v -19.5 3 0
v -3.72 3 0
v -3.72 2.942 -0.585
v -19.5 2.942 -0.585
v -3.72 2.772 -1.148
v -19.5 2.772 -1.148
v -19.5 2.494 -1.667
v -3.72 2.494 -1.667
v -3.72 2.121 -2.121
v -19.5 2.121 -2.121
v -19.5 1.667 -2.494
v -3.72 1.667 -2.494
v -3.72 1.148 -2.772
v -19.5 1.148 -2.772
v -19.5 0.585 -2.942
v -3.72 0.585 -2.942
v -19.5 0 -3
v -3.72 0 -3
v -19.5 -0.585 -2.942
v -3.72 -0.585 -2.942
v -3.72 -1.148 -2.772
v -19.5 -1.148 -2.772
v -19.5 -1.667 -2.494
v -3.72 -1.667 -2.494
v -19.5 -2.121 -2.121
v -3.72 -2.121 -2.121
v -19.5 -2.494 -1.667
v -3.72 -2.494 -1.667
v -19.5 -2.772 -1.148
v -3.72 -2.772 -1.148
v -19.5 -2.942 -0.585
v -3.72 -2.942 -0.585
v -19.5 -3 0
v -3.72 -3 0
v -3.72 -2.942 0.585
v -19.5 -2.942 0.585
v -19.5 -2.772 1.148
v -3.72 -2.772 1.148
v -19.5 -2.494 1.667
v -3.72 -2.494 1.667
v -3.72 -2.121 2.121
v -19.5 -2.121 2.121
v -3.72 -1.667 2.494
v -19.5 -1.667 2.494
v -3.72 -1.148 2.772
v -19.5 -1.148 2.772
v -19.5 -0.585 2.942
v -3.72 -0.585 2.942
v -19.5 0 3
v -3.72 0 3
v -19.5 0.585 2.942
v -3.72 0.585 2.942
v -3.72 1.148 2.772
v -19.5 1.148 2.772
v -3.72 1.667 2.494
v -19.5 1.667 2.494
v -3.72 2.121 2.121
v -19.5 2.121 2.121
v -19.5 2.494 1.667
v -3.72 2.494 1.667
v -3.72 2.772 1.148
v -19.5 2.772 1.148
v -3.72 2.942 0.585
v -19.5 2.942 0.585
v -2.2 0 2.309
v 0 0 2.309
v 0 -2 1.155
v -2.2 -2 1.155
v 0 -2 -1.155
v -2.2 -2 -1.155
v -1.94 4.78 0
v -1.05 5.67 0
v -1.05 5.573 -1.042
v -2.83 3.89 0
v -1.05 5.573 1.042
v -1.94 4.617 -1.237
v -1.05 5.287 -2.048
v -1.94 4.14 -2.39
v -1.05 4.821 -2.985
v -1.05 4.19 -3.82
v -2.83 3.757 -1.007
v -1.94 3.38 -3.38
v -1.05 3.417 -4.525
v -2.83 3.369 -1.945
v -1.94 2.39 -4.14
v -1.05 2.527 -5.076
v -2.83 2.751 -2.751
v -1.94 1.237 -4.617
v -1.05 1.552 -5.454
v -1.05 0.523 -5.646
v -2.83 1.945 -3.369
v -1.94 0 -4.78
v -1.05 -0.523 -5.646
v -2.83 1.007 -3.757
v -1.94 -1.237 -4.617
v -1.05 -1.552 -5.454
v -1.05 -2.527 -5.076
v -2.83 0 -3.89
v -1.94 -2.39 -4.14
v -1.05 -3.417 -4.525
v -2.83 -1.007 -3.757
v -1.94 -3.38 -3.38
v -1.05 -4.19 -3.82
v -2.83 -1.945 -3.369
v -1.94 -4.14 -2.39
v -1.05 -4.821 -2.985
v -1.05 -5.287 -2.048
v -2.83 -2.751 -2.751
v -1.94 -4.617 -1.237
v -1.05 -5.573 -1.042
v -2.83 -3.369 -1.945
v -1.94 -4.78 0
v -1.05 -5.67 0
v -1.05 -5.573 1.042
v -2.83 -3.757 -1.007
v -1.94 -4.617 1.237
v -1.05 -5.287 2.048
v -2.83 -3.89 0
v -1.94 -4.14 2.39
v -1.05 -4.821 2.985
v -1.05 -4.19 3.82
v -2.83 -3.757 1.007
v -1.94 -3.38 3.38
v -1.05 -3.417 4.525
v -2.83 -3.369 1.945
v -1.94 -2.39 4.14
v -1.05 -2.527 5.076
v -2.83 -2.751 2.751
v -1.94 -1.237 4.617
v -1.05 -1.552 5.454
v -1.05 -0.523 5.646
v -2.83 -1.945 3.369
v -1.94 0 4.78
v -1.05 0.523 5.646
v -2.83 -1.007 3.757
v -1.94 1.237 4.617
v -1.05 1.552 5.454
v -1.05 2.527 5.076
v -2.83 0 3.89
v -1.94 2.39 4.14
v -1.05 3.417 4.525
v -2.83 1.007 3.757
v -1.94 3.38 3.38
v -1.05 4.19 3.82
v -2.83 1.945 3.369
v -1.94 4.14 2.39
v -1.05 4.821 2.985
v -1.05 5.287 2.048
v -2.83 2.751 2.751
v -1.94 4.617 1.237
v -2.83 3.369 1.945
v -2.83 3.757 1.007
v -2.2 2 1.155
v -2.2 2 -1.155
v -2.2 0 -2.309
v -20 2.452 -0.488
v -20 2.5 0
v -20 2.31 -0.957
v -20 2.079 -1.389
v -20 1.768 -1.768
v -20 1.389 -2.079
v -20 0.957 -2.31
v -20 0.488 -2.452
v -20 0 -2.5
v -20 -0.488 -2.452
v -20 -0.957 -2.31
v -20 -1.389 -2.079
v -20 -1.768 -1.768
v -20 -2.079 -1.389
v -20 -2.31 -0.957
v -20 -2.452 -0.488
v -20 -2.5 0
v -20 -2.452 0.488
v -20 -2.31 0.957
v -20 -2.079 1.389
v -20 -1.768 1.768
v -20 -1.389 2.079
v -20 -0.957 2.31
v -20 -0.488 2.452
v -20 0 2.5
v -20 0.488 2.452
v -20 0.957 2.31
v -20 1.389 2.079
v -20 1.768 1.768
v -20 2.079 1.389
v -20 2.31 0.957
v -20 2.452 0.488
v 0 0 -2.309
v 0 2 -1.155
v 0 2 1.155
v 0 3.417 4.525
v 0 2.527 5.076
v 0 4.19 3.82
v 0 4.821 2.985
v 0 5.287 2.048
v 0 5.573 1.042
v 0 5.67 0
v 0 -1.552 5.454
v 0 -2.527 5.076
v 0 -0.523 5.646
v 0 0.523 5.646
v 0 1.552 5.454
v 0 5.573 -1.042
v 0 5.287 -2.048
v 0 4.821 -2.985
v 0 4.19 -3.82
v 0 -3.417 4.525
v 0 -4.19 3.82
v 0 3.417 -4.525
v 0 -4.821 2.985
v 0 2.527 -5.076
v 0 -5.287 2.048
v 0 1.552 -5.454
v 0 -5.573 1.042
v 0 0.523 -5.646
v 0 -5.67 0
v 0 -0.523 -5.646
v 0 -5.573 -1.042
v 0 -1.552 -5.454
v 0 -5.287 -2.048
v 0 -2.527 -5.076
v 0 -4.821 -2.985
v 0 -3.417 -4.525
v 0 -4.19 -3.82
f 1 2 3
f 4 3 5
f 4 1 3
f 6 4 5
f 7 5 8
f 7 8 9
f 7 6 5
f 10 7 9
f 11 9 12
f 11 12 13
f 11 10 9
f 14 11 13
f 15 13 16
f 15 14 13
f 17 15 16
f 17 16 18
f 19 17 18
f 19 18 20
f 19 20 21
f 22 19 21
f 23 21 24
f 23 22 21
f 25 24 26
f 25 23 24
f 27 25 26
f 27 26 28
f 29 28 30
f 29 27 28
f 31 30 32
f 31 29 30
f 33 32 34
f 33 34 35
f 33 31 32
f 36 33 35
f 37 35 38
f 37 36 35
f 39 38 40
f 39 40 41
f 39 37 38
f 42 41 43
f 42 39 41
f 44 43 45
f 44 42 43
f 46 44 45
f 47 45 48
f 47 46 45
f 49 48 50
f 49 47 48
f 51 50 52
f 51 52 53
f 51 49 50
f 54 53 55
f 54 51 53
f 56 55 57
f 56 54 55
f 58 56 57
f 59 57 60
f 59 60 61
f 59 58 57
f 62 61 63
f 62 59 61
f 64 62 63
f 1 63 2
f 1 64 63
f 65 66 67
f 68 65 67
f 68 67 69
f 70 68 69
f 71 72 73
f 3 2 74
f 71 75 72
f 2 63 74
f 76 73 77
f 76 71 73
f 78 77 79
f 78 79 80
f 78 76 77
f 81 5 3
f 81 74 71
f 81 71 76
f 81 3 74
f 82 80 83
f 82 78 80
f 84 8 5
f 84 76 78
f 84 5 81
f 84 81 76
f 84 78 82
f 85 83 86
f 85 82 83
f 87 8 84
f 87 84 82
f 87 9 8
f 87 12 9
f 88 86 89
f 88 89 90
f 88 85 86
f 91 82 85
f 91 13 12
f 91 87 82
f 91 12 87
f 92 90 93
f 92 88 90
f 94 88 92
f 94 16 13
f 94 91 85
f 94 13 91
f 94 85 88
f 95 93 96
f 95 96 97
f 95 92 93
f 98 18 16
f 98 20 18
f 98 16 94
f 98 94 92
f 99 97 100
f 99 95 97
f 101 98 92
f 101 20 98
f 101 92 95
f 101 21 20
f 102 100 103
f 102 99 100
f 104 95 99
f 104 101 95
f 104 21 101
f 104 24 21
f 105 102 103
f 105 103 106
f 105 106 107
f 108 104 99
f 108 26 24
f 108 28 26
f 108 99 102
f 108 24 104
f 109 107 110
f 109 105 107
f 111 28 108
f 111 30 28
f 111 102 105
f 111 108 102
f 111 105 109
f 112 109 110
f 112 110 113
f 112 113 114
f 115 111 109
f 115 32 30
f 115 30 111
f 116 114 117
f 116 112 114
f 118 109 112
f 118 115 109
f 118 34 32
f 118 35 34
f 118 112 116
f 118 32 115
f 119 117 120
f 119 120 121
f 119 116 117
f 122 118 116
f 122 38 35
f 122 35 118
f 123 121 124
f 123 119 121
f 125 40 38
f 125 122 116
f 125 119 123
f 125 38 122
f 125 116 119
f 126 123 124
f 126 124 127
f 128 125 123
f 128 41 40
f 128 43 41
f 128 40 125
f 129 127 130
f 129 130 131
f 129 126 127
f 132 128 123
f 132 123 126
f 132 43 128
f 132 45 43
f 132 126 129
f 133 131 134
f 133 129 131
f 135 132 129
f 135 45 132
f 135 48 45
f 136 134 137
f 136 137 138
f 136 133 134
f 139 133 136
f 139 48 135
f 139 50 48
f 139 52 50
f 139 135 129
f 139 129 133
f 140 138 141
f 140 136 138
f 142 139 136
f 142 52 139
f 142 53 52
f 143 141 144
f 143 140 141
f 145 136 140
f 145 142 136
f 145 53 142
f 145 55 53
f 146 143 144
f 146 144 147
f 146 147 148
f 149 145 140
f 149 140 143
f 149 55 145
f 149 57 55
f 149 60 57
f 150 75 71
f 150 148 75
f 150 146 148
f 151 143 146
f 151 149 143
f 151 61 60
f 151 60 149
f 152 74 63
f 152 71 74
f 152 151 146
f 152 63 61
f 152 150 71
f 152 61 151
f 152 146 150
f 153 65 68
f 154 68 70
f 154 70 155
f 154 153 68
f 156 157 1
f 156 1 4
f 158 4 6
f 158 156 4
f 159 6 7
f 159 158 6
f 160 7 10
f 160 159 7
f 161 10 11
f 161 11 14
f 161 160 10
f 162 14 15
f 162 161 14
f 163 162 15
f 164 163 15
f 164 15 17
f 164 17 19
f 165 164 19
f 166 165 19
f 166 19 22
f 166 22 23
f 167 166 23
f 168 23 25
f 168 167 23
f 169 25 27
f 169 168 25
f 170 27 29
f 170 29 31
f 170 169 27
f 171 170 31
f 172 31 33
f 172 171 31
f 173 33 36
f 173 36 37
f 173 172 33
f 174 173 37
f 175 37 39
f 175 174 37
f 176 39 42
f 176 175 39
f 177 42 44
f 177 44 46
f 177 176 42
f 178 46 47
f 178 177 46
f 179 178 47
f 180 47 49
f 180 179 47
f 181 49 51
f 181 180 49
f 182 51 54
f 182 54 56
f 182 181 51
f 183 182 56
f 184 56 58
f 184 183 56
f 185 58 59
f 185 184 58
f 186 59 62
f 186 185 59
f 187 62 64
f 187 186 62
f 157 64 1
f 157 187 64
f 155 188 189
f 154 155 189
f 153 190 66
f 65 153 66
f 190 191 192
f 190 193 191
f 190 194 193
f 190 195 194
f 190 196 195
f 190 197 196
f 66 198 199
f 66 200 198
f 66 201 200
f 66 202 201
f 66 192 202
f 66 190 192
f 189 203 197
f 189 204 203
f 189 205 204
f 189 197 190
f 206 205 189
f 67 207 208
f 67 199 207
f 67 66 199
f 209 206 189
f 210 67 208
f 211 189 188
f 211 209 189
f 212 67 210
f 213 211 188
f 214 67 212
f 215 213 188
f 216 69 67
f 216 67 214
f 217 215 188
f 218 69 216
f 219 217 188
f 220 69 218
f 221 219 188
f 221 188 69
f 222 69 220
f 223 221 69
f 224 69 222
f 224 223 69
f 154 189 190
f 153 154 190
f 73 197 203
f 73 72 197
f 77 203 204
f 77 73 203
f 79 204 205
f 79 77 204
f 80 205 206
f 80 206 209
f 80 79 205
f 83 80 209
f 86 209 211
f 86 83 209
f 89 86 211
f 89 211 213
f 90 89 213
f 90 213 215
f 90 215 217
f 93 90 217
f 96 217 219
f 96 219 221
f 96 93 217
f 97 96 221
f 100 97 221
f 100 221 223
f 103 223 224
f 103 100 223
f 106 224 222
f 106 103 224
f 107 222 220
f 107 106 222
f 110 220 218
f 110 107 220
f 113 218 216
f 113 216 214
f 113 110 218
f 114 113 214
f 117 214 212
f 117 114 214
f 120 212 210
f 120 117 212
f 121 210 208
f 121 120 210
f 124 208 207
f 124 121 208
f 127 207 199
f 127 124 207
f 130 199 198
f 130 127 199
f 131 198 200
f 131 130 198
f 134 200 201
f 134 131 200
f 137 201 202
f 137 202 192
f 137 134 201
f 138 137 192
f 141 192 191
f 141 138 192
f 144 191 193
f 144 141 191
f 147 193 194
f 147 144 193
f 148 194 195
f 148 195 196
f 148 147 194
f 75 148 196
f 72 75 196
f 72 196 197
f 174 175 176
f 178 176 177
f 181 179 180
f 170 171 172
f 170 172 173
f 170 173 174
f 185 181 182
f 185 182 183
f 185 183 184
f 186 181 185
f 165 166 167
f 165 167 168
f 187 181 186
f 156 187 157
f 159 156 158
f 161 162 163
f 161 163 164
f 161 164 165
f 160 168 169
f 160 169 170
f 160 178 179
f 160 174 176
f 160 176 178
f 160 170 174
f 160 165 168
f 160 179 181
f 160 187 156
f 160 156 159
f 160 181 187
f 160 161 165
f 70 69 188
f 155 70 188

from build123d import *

# Parameters (mm, degrees)
CUT_EXTRUDE1_DEPTH = 2.2
CHAMFER1_SIZE      = 0.5


with BuildPart() as part:
    # Sketch1 → Revolve1 (revolve)
    with BuildSketch(Plane.XY):
        Polygon((0, 0), (0, 5.67), (-1.05, 5.67), (-3.72, 3), (-20, 3), (-20, 0), align=None)
    revolve(axis=Axis((0, 0, 0), (-1, 0, 0)))

    # Sketch2 → Cut-Extrude1 (cut)
    with BuildSketch(Plane(origin=(0, 0, 0), x_dir=(0, 0, -1), z_dir=(1, 0, 0))):
        Polygon((2.309401077, 0), (1.154700538, 2), (-1.154700538, 2), (-2.309401077, 0), (-1.154700538, -2), (1.154700538, -2), align=None)
    extrude(amount=-CUT_EXTRUDE1_DEPTH, mode=Mode.SUBTRACT)

    # Chamfer1
    chamfer1_edges = [part.edges().sort_by_distance(p)[0] for p in [
        (-20, -3, 0),
    ]]
    chamfer(chamfer1_edges, length=CHAMFER1_SIZE)


solid = part.part
